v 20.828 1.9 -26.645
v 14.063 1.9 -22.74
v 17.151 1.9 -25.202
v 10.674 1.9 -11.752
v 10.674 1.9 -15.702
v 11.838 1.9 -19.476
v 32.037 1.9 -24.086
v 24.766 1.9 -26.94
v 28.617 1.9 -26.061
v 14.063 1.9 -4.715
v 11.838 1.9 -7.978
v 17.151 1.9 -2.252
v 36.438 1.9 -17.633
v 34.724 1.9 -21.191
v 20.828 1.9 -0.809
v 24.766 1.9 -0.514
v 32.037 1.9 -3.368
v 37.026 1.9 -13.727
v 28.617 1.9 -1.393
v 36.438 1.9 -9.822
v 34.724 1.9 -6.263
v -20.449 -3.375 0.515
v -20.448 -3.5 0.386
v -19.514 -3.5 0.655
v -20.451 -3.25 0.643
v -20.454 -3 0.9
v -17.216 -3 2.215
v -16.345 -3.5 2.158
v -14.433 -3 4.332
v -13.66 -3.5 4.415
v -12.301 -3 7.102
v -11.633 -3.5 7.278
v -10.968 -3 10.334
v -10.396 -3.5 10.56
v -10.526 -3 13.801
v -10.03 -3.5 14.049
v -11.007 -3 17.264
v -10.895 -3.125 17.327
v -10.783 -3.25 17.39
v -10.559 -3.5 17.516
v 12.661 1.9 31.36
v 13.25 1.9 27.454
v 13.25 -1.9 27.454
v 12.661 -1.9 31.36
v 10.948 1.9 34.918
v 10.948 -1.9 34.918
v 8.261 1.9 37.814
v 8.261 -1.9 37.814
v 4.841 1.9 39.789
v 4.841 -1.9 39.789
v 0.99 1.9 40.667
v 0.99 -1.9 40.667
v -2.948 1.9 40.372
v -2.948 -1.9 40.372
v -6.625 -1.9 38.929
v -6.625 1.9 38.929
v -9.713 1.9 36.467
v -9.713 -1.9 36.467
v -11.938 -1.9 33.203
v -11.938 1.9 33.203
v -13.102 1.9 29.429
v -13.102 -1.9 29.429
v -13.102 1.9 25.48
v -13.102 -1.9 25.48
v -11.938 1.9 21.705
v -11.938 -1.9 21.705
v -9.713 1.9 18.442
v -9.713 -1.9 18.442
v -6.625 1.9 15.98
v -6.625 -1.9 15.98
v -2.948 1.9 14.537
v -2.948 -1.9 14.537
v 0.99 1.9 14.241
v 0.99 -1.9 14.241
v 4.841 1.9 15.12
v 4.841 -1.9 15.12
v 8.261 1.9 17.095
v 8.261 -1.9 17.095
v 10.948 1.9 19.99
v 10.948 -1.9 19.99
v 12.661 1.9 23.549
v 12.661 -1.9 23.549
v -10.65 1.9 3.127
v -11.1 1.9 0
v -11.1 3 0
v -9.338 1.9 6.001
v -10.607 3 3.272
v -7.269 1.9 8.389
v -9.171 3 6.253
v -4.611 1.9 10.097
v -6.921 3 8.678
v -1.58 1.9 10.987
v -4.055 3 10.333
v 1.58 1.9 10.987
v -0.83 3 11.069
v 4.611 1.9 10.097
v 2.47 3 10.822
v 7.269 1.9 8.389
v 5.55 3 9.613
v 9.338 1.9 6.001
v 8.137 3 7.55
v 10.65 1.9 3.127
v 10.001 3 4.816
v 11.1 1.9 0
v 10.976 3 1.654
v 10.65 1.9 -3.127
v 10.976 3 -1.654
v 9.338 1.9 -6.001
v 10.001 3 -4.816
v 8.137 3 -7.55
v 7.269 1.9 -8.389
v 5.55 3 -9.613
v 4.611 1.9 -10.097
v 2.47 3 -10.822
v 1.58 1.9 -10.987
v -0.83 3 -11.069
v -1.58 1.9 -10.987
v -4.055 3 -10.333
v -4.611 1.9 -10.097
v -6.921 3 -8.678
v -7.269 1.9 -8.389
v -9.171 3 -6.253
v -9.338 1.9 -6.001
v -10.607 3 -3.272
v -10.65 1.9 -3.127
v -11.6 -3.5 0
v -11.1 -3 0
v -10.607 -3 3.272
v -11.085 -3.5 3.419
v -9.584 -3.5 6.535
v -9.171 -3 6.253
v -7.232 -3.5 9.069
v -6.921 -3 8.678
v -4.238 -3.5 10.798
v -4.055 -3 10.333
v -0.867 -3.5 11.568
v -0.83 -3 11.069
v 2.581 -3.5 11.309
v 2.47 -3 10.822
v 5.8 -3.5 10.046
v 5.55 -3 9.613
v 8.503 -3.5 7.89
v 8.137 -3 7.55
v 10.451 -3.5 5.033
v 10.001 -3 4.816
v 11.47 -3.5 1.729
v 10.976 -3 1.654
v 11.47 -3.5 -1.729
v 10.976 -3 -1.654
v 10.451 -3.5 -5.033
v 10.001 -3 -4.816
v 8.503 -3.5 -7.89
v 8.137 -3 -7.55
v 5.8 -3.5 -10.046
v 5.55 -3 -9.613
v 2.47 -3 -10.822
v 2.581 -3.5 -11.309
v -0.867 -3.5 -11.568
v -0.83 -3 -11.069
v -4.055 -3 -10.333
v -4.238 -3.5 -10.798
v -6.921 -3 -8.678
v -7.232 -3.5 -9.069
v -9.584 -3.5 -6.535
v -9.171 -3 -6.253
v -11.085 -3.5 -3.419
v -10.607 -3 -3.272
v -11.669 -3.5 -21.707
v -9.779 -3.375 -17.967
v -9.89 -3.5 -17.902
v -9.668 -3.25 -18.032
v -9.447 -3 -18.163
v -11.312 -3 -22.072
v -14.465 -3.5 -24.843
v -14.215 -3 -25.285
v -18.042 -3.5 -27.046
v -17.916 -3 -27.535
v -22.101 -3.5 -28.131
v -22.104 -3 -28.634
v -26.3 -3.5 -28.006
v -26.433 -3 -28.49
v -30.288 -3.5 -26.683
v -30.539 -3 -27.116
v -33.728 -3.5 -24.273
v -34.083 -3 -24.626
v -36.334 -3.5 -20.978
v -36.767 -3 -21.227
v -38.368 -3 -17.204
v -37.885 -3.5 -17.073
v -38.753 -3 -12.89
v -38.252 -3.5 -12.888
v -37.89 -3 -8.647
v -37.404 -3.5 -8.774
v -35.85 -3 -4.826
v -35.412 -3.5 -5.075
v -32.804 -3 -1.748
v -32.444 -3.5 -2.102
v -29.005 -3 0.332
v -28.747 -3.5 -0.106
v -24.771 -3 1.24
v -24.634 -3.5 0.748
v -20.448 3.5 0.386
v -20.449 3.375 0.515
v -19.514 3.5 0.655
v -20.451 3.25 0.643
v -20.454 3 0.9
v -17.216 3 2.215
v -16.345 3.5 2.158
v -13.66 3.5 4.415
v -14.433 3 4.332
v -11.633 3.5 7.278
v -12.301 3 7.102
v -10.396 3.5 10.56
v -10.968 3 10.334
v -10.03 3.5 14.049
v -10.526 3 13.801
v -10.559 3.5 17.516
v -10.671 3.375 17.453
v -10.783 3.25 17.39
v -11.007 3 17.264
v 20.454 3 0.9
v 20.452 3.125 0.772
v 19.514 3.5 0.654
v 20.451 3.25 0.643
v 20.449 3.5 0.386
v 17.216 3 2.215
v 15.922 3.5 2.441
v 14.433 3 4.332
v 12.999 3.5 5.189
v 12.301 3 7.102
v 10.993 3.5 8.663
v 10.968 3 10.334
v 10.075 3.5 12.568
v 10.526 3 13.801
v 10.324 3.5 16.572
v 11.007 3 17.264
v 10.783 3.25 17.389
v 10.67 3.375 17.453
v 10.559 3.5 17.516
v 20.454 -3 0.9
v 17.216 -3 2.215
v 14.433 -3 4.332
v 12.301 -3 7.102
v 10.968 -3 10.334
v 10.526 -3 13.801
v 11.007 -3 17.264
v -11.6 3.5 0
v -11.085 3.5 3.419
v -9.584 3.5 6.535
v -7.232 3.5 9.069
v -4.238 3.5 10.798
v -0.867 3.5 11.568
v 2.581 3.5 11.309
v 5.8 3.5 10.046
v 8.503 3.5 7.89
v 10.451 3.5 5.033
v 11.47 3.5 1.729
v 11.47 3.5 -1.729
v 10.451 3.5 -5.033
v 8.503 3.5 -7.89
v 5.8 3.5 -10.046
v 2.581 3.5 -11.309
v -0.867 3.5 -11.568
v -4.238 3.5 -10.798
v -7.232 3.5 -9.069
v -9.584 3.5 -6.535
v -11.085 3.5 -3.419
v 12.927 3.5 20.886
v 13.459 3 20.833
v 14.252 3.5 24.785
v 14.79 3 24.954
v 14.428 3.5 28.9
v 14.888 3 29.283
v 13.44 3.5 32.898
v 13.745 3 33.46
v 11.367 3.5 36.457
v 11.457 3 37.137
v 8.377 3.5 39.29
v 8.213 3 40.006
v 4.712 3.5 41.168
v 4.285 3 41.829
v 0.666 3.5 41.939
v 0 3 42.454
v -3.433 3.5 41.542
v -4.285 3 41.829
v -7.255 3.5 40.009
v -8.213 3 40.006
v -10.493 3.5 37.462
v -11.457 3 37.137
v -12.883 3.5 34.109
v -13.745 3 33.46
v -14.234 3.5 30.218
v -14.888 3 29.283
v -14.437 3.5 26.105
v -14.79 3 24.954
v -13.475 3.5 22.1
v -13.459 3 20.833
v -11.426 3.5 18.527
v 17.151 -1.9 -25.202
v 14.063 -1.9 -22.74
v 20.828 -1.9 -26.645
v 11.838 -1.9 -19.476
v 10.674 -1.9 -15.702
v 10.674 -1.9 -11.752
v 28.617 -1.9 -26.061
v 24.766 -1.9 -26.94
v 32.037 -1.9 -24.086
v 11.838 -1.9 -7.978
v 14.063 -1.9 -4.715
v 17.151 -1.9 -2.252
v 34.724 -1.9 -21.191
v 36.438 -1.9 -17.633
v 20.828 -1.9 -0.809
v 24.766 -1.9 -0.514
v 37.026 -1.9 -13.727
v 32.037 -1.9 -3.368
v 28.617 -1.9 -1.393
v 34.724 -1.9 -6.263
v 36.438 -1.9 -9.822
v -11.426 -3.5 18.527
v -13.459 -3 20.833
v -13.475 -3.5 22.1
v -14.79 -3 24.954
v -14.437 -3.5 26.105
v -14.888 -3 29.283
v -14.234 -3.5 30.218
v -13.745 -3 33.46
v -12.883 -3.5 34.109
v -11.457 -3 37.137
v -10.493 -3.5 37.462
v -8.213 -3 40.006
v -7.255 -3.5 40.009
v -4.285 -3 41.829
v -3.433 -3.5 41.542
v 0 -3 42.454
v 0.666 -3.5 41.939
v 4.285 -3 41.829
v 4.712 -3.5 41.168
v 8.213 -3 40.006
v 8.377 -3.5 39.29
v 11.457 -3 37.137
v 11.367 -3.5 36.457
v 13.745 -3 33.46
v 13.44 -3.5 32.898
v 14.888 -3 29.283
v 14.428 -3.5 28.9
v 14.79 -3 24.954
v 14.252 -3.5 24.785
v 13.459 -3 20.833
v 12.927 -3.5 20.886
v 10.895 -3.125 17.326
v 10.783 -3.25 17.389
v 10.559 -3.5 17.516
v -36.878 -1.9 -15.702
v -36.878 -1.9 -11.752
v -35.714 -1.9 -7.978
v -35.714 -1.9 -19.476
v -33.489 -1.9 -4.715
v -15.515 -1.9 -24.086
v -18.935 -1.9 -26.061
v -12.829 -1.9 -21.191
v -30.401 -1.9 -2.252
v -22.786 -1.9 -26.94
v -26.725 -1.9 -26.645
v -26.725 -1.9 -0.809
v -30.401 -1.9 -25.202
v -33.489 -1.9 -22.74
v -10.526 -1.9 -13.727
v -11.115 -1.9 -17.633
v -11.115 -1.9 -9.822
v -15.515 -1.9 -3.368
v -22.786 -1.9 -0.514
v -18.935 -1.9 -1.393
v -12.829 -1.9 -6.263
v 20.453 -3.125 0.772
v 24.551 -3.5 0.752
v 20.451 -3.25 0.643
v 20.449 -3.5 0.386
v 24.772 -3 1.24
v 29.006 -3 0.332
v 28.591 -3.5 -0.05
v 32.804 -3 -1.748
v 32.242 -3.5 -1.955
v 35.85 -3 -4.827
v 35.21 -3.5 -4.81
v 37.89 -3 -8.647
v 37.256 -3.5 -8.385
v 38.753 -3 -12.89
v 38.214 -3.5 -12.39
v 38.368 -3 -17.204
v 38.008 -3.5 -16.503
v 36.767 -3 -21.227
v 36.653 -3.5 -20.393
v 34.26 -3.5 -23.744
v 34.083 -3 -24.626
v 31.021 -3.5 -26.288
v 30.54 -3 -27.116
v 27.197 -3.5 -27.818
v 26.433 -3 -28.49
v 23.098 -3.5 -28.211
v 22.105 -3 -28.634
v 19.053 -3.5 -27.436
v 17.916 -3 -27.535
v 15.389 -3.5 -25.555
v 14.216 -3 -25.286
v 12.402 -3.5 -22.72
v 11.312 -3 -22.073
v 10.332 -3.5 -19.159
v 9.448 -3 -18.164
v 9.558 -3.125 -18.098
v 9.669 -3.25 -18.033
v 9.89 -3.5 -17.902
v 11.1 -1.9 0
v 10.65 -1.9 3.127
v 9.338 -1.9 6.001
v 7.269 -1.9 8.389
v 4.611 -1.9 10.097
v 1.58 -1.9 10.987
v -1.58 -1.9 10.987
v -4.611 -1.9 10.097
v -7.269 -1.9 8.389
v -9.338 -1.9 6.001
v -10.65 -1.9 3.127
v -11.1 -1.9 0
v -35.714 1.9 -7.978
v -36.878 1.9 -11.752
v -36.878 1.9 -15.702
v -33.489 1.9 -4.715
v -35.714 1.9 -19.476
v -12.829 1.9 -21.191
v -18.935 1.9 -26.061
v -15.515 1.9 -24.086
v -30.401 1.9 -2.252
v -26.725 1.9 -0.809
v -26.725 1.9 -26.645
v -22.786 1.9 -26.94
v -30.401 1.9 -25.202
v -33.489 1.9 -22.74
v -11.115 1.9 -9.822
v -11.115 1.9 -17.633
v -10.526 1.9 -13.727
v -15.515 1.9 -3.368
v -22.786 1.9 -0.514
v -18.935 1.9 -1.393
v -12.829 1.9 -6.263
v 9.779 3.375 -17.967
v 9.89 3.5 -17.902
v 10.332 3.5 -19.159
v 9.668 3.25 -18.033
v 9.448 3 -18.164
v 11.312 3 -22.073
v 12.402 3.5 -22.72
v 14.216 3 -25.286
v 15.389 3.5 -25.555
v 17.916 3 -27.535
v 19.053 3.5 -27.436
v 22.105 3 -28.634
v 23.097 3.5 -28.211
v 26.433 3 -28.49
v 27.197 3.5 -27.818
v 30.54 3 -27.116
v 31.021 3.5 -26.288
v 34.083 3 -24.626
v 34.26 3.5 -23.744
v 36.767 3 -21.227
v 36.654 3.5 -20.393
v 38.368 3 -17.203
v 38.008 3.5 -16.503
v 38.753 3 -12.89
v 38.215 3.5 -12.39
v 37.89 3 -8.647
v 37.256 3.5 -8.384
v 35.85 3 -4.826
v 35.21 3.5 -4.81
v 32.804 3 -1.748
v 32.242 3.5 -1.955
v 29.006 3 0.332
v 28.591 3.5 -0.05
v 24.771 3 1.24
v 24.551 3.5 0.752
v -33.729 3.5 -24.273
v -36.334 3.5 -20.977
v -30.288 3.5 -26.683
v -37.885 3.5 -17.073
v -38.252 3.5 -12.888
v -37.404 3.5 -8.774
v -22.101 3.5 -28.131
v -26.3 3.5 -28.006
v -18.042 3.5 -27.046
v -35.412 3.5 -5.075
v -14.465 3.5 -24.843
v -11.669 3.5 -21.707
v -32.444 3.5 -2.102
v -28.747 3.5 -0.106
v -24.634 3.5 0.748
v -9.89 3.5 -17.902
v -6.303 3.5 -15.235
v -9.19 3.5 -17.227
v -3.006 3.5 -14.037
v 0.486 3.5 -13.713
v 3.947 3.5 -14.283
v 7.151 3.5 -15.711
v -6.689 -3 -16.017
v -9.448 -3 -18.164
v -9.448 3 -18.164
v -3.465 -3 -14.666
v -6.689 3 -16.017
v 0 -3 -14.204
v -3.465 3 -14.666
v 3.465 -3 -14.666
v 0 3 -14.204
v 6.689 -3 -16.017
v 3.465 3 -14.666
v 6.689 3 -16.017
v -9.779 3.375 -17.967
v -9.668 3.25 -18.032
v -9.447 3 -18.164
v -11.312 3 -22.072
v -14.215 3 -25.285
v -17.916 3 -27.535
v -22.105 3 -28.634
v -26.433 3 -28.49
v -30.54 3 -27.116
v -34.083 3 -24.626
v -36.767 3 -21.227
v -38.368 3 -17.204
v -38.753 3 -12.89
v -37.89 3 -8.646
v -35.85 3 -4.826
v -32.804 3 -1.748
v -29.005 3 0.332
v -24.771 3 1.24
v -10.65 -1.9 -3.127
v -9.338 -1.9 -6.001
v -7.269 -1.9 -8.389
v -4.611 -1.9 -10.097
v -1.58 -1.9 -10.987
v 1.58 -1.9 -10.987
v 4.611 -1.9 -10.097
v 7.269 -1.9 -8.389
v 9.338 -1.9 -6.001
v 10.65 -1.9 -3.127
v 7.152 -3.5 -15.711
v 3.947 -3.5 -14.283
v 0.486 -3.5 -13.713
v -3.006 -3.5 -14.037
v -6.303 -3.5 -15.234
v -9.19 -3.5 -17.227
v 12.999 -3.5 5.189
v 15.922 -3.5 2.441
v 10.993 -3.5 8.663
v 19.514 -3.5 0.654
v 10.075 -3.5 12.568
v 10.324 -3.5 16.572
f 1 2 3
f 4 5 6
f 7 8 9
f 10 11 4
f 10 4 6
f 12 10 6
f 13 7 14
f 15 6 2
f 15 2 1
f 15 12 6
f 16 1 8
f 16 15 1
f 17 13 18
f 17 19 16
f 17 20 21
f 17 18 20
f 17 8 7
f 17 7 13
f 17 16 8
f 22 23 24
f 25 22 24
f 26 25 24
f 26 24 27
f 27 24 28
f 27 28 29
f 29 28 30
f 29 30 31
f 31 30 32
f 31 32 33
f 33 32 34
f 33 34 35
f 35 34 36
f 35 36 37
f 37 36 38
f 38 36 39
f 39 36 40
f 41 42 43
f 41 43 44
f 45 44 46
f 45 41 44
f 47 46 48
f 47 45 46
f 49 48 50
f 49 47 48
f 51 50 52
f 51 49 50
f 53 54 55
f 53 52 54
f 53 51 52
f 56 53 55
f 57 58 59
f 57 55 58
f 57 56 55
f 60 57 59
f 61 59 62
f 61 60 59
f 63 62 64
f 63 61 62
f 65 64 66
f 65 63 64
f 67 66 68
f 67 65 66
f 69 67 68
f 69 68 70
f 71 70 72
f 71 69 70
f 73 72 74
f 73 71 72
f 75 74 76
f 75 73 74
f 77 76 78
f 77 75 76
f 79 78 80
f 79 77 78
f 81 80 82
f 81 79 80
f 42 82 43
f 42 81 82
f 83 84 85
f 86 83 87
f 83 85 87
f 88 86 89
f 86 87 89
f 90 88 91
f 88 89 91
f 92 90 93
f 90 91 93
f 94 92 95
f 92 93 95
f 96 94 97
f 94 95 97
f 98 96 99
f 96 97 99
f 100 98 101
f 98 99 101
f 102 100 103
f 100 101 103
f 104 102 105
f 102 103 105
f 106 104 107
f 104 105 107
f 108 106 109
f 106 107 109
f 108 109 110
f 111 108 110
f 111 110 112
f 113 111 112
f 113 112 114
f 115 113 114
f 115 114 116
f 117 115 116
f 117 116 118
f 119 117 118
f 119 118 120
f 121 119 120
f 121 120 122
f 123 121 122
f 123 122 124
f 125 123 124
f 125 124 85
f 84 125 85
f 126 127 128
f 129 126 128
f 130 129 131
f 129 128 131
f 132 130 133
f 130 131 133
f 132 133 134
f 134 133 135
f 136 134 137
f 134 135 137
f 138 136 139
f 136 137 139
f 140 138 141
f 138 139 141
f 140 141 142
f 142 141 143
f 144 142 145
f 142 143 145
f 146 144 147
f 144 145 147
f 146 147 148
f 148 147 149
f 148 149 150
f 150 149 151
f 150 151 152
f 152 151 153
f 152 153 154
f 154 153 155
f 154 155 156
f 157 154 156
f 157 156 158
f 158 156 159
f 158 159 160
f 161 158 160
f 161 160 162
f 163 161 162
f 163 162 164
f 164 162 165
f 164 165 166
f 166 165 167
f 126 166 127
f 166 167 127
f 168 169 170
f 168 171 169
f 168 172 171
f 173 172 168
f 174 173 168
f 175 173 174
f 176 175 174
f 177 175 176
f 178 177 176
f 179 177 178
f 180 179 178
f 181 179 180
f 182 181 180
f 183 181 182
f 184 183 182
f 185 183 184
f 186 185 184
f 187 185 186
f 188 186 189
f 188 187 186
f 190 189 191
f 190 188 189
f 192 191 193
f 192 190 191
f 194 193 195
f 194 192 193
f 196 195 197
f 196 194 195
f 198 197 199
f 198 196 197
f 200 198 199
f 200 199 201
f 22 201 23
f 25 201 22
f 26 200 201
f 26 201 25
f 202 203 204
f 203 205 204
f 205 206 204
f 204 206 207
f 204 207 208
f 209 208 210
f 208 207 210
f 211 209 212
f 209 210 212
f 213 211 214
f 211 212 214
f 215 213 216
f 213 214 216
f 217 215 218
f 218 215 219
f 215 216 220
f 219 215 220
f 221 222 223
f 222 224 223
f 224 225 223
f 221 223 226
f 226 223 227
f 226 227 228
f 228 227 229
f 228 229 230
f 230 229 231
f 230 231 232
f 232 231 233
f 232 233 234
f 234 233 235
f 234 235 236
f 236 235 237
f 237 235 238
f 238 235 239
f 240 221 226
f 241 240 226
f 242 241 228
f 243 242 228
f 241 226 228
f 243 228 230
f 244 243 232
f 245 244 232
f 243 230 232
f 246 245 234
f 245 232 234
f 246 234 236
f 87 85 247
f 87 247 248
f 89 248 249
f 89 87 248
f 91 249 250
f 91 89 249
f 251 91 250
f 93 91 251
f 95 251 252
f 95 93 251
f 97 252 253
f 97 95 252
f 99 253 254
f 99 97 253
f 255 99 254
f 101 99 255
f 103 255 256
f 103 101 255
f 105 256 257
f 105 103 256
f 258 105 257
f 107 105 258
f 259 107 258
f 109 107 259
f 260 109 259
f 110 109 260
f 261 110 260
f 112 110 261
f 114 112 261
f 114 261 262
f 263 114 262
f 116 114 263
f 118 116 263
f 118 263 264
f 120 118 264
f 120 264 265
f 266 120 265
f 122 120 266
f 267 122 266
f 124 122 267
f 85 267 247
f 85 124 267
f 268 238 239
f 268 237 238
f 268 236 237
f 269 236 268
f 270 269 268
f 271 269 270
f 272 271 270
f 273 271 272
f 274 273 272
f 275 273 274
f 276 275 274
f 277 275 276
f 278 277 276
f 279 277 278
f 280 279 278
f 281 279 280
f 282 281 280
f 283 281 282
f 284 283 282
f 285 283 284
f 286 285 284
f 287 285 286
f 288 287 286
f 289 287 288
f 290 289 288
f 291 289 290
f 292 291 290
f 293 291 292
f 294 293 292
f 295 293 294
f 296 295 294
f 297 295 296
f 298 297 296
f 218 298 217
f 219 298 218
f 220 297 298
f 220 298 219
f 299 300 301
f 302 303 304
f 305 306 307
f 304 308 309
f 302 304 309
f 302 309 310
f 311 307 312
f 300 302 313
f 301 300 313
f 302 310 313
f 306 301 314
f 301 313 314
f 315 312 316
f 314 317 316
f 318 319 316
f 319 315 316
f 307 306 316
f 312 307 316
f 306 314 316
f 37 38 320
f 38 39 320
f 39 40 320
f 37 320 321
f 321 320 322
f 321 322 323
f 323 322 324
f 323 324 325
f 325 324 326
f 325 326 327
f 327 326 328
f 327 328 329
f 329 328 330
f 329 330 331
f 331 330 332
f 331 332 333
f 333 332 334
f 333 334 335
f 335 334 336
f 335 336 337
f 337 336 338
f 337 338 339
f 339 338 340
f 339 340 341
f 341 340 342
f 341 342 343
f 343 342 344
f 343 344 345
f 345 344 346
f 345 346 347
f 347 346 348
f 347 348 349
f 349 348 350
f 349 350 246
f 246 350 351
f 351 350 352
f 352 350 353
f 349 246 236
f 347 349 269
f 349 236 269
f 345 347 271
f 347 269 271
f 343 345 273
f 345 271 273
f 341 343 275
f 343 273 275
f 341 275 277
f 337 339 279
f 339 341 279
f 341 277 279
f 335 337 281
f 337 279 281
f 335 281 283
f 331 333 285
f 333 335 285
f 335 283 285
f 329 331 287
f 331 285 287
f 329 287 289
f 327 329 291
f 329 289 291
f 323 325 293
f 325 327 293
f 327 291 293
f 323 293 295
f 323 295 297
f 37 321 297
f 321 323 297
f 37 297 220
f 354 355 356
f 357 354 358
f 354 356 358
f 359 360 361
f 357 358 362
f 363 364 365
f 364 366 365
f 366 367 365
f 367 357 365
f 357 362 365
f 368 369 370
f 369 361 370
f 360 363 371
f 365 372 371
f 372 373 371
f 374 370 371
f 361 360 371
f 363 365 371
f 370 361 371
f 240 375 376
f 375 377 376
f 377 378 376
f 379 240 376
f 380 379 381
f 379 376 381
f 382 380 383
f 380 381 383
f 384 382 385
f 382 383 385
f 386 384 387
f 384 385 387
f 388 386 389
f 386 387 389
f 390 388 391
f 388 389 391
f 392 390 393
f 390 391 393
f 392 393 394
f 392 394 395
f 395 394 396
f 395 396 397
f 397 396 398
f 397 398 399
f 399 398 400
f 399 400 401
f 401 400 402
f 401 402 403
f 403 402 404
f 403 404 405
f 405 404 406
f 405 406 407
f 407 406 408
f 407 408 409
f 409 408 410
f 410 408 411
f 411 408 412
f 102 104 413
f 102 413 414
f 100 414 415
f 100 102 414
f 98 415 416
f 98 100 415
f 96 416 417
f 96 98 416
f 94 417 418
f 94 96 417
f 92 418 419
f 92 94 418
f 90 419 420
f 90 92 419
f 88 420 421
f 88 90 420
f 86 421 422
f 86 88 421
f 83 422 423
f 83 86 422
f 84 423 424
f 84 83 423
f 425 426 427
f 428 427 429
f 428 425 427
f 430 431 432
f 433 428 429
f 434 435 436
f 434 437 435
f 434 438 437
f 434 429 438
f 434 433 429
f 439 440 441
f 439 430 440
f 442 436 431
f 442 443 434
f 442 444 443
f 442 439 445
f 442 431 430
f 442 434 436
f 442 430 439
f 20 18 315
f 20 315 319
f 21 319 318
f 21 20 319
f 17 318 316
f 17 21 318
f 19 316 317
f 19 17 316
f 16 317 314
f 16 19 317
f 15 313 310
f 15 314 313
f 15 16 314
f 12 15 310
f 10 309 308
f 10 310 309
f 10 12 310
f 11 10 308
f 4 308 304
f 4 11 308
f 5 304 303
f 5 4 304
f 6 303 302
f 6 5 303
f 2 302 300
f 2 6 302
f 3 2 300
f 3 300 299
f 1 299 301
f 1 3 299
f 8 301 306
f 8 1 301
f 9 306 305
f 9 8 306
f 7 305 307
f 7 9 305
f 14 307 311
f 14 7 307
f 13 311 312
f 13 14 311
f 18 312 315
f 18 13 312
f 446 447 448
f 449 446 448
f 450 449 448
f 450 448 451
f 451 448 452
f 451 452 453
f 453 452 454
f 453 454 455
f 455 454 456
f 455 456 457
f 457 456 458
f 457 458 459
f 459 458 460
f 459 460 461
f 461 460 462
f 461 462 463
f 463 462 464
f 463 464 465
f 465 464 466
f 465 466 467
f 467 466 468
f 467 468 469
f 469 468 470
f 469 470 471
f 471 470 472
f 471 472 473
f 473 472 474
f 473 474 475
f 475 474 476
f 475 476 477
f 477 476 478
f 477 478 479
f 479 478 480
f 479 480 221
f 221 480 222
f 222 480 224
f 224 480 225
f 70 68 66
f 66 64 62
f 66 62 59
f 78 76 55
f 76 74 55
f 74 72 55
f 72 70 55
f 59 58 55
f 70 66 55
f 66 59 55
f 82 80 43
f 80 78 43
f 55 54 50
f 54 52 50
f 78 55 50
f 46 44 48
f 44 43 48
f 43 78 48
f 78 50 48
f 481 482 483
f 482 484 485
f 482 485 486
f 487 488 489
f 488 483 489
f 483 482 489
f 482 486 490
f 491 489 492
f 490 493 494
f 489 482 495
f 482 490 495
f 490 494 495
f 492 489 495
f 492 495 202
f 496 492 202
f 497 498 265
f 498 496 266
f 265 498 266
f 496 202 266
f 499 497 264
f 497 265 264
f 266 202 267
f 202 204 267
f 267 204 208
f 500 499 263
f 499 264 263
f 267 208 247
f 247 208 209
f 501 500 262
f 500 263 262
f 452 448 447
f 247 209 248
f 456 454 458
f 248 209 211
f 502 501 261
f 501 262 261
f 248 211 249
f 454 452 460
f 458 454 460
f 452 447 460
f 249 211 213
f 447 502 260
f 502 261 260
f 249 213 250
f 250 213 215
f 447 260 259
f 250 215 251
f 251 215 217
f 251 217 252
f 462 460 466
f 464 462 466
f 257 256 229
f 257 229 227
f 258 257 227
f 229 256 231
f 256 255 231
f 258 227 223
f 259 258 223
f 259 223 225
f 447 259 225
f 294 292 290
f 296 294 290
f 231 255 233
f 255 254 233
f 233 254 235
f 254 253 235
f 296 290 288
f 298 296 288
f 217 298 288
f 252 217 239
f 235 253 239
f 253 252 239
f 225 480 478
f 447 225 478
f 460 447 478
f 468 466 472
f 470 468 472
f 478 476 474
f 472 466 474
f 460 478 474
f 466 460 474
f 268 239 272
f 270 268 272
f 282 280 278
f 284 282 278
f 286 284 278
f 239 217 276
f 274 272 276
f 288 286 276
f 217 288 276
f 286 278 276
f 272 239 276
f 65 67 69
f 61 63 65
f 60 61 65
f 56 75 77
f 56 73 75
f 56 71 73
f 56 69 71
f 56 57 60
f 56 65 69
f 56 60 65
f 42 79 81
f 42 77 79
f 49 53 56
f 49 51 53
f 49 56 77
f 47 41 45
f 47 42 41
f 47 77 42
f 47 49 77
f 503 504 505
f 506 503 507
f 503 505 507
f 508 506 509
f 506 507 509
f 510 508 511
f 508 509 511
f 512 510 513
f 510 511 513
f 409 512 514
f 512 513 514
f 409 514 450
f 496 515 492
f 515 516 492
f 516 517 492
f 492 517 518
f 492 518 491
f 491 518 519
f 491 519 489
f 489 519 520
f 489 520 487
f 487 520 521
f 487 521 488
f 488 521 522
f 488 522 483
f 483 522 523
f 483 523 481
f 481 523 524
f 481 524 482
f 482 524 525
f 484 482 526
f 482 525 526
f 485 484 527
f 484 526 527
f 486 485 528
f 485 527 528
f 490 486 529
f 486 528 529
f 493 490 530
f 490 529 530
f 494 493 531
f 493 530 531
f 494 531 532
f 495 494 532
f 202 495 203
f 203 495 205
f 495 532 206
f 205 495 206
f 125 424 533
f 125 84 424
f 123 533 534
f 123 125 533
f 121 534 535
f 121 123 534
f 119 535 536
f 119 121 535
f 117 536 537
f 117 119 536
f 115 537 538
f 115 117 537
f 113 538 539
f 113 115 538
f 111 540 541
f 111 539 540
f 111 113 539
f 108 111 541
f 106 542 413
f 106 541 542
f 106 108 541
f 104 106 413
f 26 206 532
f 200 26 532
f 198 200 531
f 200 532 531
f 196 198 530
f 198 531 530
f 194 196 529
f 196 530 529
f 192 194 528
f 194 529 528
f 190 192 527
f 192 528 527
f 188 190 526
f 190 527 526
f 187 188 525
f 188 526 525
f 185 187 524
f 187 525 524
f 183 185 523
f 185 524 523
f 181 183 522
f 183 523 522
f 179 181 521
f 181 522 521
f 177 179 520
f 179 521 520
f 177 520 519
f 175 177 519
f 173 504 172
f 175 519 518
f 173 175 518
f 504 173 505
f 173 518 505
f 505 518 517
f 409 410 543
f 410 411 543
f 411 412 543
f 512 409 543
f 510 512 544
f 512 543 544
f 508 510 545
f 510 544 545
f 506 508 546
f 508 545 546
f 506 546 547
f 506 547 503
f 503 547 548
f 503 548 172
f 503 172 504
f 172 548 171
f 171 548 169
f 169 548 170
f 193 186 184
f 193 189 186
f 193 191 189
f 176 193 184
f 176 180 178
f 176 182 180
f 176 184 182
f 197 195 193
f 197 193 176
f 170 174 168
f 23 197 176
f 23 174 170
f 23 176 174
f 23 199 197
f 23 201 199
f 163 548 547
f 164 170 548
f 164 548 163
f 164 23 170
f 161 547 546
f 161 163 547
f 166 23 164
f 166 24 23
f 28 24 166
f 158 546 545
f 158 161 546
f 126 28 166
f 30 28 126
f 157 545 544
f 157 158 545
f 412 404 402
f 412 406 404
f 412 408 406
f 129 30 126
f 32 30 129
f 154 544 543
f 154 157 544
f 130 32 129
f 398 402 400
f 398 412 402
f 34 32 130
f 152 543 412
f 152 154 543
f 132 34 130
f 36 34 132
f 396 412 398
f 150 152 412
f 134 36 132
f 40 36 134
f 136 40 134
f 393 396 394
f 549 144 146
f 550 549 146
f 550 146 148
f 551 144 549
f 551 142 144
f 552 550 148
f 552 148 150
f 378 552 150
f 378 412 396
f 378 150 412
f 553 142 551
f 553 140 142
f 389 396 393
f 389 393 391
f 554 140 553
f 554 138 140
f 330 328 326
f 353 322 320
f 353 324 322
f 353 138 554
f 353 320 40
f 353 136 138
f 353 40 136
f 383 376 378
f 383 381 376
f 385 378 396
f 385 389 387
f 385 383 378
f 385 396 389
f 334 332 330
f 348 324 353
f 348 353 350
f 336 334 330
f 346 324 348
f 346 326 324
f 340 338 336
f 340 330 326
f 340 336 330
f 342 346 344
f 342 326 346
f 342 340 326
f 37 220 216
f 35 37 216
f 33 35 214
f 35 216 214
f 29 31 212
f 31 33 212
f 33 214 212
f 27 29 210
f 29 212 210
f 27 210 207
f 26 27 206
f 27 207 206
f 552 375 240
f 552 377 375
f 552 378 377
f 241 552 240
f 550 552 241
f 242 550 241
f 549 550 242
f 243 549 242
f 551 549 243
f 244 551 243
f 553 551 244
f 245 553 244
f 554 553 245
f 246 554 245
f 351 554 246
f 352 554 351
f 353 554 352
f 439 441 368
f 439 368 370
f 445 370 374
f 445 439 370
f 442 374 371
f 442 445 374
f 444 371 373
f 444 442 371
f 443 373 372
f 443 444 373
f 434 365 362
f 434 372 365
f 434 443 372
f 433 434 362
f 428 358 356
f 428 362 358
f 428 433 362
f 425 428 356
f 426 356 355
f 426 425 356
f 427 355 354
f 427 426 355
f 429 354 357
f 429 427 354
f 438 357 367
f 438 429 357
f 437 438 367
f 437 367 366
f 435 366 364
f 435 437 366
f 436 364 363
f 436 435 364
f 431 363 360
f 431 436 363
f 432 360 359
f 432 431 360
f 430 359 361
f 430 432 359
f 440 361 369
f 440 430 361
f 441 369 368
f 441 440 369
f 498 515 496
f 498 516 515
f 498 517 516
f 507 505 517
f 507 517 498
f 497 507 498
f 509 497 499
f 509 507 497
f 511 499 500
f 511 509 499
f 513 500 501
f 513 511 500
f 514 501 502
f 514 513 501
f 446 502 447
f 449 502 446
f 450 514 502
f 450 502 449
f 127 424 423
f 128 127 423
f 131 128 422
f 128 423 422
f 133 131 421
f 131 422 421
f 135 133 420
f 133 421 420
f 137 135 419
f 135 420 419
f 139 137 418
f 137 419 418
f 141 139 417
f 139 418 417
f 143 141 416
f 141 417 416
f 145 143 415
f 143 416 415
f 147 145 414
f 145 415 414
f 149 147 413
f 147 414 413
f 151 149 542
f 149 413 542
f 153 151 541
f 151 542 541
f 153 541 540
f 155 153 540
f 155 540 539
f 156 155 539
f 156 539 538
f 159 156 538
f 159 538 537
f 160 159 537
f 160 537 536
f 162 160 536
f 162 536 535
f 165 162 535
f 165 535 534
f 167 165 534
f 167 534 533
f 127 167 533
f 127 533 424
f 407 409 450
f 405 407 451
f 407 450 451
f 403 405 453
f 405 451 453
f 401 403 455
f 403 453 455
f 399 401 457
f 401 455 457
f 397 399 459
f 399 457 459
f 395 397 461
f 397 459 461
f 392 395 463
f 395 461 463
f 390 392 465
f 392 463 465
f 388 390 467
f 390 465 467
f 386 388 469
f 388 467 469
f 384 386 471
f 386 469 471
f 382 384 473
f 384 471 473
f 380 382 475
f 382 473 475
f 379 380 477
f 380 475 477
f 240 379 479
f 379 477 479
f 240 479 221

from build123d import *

# Parameters (mm, degrees)
F0_R        = 13.25
F0_R_2      = 11.1
F1_DEPTH    = 3
F2_START    = 1.9
F2_DEPTH    = 1.6
F3_START    = -1.9
F3_DEPTH    = 1.6
F5_D        = 22.2
F6_C1_SIZE  = 0.5
F6_C2_SIZE  = 0.5
F6_C3_SIZE  = 0.4999
F6_C4_SIZE  = 0.4999
F6_C5_SIZE  = 0.4999
F6_C6_SIZE  = 0.4999
F6_C7_SIZE  = 0.4996
F6_C8_SIZE  = 0.5
F6_C9_SIZE  = 0.4999
F6_C10_SIZE = 0.5
F6_C11_SIZE = 0.5
F6_C12_SIZE = 0.4999
F6_C13_SIZE = 0.4996
F6_C14_SIZE = 0.5


# Not quite as in the source:
# - a fillet or chamfer is up to 0.001 mm smaller than in the source, because OpenCascade refuses the exact size


with BuildPart() as f1:
    # F0 (on Front) → F1 (new body, symmetric)
    with BuildSketch(Plane.XZ):
        with BuildLine():
            ThreePointArc((20.4544666255, 0.9003555386), (12.301399045, 7.10221605), (11.0069640816, 17.2639099492))
            ThreePointArc((11.0069640816, 17.2639099492), (0, 42.4544321001), (-11.0069640816, 17.2639099492))
            ThreePointArc((-11.0069640816, 17.2639099492), (-12.301399045, 7.10221605), (-20.4544666255, 0.9003555386))
            ThreePointArc((-20.4544666255, 0.9003555386), (-36.7666167019, -21.22721605), (-9.4475025439, -18.1642654878))
            ThreePointArc((-9.4475025439, -18.1642654878), (0, -14.2044321001), (9.4475025439, -18.1642654878))
            ThreePointArc((9.4475025439, -18.1642654878), (36.7666167019, -21.22721605), (20.4544666255, 0.9003555386))
        make_face()
        with Locations((-23.7762356451, -13.72721605)):
            Circle(F0_R, mode=Mode.SUBTRACT)
        with Locations((23.7762356451, -13.72721605)):
            Circle(F0_R, mode=Mode.SUBTRACT)
        Circle(F0_R_2, mode=Mode.SUBTRACT)
        with Locations((0, 27.4544321001)):
            Circle(F0_R, mode=Mode.SUBTRACT)
    extrude(amount=F1_DEPTH, both=True)

    # F0 (on Front) → F2 (join)
    with BuildSketch(Plane.XZ.offset(F2_START)):
        with BuildLine():
            ThreePointArc((20.4544666255, 0.9003555386), (12.301399045, 7.10221605), (11.0069640816, 17.2639099492))
            ThreePointArc((11.0069640816, 17.2639099492), (0, 42.4544321001), (-11.0069640816, 17.2639099492))
            ThreePointArc((-11.0069640816, 17.2639099492), (-12.301399045, 7.10221605), (-20.4544666255, 0.9003555386))
            ThreePointArc((-20.4544666255, 0.9003555386), (-36.7666167019, -21.22721605), (-9.4475025439, -18.1642654878))
            ThreePointArc((-9.4475025439, -18.1642654878), (0, -14.2044321001), (9.4475025439, -18.1642654878))
            ThreePointArc((9.4475025439, -18.1642654878), (36.7666167019, -21.22721605), (20.4544666255, 0.9003555386))
        make_face()
        with Locations((-23.7762356451, -13.72721605)):
            Circle(F0_R, mode=Mode.SUBTRACT)
        with Locations((23.7762356451, -13.72721605)):
            Circle(F0_R, mode=Mode.SUBTRACT)
        Circle(F0_R_2, mode=Mode.SUBTRACT)
        with Locations((0, 27.4544321001)):
            Circle(F0_R, mode=Mode.SUBTRACT)
        with Locations((-23.7762356451, -13.72721605)):
            Circle(F0_R)
        with Locations((0, 27.4544321001)):
            Circle(F0_R)
        with Locations((23.7762356451, -13.72721605)):
            Circle(F0_R)
        Circle(F0_R_2)
    extrude(amount=F2_DEPTH)

    # F0 (on Front) → F3 (join)
    with BuildSketch(Plane.XZ.offset(F3_START)):
        with BuildLine():
            ThreePointArc((20.4544666255, 0.9003555386), (12.301399045, 7.10221605), (11.0069640816, 17.2639099492))
            ThreePointArc((11.0069640816, 17.2639099492), (0, 42.4544321001), (-11.0069640816, 17.2639099492))
            ThreePointArc((-11.0069640816, 17.2639099492), (-12.301399045, 7.10221605), (-20.4544666255, 0.9003555386))
            ThreePointArc((-20.4544666255, 0.9003555386), (-36.7666167019, -21.22721605), (-9.4475025439, -18.1642654878))
            ThreePointArc((-9.4475025439, -18.1642654878), (0, -14.2044321001), (9.4475025439, -18.1642654878))
            ThreePointArc((9.4475025439, -18.1642654878), (36.7666167019, -21.22721605), (20.4544666255, 0.9003555386))
        make_face()
        with Locations((-23.7762356451, -13.72721605)):
            Circle(F0_R, mode=Mode.SUBTRACT)
        with Locations((23.7762356451, -13.72721605)):
            Circle(F0_R, mode=Mode.SUBTRACT)
        Circle(F0_R_2, mode=Mode.SUBTRACT)
        with Locations((0, 27.4544321001)):
            Circle(F0_R, mode=Mode.SUBTRACT)
        with Locations((0, 27.4544321001)):
            Circle(F0_R)
        with Locations((-23.7762356451, -13.72721605)):
            Circle(F0_R)
        with Locations((23.7762356451, -13.72721605)):
            Circle(F0_R)
        Circle(F0_R_2)
    extrude(amount=-F3_DEPTH)

    # F5 (through all)
    with Locations(Plane.XZ.offset(3.5)):
        with Locations((0, 0)):
            Hole(F5_D / 2)

    # F6: chamfer of 0.5 on 14 edges, made by hand

    # F6_c1
    f6_c1_edges = [f1.edges().sort_by_distance(p)[0] for p in [
        (12.301399045, 3.5, 7.10221605),
    ]]
    chamfer(f6_c1_edges, length=F6_C1_SIZE)

    # F6_c2
    f6_c2_edges = [f1.edges().sort_by_distance(p)[0] for p in [
        (12.301399045, -3.5, 7.10221605),
    ]]
    chamfer(f6_c2_edges, length=F6_C2_SIZE)

    # F6_c3 (size 0.5 in the source; OpenCascade refuses exactly that, so slightly less here)
    f6_c3_edges = [f1.edges().sort_by_distance(p)[0] for p in [
        (36.7666167019, 3.5, -21.22721605),
    ]]
    chamfer(f6_c3_edges, length=F6_C3_SIZE)

    # F6_c4 (size 0.5 in the source; OpenCascade refuses exactly that, so slightly less here)
    f6_c4_edges = [f1.edges().sort_by_distance(p)[0] for p in [
        (0, 3.5, 42.4544321001),
    ]]
    chamfer(f6_c4_edges, length=F6_C4_SIZE)

    # F6_c5 (size 0.5 in the source; OpenCascade refuses exactly that, so slightly less here)
    f6_c5_edges = [f1.edges().sort_by_distance(p)[0] for p in [
        (0, 3.5, -14.2044321001),
    ]]
    chamfer(f6_c5_edges, length=F6_C5_SIZE)

    # F6_c6 (size 0.5 in the source; OpenCascade refuses exactly that, so slightly less here)
    f6_c6_edges = [f1.edges().sort_by_distance(p)[0] for p in [
        (-12.301399045, 3.5, 7.10221605),
    ]]
    chamfer(f6_c6_edges, length=F6_C6_SIZE)

    # F6_c7 (size 0.5 in the source; OpenCascade refuses exactly that, so slightly less here)
    f6_c7_edges = [f1.edges().sort_by_distance(p)[0] for p in [
        (-36.7666167019, 3.5, -21.22721605),
    ]]
    chamfer(f6_c7_edges, length=F6_C7_SIZE)

    # F6_c8
    f6_c8_edges = [f1.edges().sort_by_distance(p)[0] for p in [
        (-11.1, 3.5, 0),
    ]]
    chamfer(f6_c8_edges, length=F6_C8_SIZE)

    # F6_c9 (size 0.5 in the source; OpenCascade refuses exactly that, so slightly less here)
    f6_c9_edges = [f1.edges().sort_by_distance(p)[0] for p in [
        (0, -3.5, 42.4544321001),
    ]]
    chamfer(f6_c9_edges, length=F6_C9_SIZE)

    # F6_c10
    f6_c10_edges = [f1.edges().sort_by_distance(p)[0] for p in [
        (36.7666167019, -3.5, -21.22721605),
    ]]
    chamfer(f6_c10_edges, length=F6_C10_SIZE)

    # F6_c11
    f6_c11_edges = [f1.edges().sort_by_distance(p)[0] for p in [
        (0, -3.5, -14.2044321001),
    ]]
    chamfer(f6_c11_edges, length=F6_C11_SIZE)

    # F6_c12 (size 0.5 in the source; OpenCascade refuses exactly that, so slightly less here)
    f6_c12_edges = [f1.edges().sort_by_distance(p)[0] for p in [
        (-12.301399045, -3.5, 7.10221605),
    ]]
    chamfer(f6_c12_edges, length=F6_C12_SIZE)

    # F6_c13 (size 0.5 in the source; OpenCascade refuses exactly that, so slightly less here)
    f6_c13_edges = [f1.edges().sort_by_distance(p)[0] for p in [
        (-36.7666167019, -3.5, -21.22721605),
    ]]
    chamfer(f6_c13_edges, length=F6_C13_SIZE)

    # F6_c14
    f6_c14_edges = [f1.edges().sort_by_distance(p)[0] for p in [
        (-11.1, -3.5, 0),
    ]]
    chamfer(f6_c14_edges, length=F6_C14_SIZE)


solid = f1.part
